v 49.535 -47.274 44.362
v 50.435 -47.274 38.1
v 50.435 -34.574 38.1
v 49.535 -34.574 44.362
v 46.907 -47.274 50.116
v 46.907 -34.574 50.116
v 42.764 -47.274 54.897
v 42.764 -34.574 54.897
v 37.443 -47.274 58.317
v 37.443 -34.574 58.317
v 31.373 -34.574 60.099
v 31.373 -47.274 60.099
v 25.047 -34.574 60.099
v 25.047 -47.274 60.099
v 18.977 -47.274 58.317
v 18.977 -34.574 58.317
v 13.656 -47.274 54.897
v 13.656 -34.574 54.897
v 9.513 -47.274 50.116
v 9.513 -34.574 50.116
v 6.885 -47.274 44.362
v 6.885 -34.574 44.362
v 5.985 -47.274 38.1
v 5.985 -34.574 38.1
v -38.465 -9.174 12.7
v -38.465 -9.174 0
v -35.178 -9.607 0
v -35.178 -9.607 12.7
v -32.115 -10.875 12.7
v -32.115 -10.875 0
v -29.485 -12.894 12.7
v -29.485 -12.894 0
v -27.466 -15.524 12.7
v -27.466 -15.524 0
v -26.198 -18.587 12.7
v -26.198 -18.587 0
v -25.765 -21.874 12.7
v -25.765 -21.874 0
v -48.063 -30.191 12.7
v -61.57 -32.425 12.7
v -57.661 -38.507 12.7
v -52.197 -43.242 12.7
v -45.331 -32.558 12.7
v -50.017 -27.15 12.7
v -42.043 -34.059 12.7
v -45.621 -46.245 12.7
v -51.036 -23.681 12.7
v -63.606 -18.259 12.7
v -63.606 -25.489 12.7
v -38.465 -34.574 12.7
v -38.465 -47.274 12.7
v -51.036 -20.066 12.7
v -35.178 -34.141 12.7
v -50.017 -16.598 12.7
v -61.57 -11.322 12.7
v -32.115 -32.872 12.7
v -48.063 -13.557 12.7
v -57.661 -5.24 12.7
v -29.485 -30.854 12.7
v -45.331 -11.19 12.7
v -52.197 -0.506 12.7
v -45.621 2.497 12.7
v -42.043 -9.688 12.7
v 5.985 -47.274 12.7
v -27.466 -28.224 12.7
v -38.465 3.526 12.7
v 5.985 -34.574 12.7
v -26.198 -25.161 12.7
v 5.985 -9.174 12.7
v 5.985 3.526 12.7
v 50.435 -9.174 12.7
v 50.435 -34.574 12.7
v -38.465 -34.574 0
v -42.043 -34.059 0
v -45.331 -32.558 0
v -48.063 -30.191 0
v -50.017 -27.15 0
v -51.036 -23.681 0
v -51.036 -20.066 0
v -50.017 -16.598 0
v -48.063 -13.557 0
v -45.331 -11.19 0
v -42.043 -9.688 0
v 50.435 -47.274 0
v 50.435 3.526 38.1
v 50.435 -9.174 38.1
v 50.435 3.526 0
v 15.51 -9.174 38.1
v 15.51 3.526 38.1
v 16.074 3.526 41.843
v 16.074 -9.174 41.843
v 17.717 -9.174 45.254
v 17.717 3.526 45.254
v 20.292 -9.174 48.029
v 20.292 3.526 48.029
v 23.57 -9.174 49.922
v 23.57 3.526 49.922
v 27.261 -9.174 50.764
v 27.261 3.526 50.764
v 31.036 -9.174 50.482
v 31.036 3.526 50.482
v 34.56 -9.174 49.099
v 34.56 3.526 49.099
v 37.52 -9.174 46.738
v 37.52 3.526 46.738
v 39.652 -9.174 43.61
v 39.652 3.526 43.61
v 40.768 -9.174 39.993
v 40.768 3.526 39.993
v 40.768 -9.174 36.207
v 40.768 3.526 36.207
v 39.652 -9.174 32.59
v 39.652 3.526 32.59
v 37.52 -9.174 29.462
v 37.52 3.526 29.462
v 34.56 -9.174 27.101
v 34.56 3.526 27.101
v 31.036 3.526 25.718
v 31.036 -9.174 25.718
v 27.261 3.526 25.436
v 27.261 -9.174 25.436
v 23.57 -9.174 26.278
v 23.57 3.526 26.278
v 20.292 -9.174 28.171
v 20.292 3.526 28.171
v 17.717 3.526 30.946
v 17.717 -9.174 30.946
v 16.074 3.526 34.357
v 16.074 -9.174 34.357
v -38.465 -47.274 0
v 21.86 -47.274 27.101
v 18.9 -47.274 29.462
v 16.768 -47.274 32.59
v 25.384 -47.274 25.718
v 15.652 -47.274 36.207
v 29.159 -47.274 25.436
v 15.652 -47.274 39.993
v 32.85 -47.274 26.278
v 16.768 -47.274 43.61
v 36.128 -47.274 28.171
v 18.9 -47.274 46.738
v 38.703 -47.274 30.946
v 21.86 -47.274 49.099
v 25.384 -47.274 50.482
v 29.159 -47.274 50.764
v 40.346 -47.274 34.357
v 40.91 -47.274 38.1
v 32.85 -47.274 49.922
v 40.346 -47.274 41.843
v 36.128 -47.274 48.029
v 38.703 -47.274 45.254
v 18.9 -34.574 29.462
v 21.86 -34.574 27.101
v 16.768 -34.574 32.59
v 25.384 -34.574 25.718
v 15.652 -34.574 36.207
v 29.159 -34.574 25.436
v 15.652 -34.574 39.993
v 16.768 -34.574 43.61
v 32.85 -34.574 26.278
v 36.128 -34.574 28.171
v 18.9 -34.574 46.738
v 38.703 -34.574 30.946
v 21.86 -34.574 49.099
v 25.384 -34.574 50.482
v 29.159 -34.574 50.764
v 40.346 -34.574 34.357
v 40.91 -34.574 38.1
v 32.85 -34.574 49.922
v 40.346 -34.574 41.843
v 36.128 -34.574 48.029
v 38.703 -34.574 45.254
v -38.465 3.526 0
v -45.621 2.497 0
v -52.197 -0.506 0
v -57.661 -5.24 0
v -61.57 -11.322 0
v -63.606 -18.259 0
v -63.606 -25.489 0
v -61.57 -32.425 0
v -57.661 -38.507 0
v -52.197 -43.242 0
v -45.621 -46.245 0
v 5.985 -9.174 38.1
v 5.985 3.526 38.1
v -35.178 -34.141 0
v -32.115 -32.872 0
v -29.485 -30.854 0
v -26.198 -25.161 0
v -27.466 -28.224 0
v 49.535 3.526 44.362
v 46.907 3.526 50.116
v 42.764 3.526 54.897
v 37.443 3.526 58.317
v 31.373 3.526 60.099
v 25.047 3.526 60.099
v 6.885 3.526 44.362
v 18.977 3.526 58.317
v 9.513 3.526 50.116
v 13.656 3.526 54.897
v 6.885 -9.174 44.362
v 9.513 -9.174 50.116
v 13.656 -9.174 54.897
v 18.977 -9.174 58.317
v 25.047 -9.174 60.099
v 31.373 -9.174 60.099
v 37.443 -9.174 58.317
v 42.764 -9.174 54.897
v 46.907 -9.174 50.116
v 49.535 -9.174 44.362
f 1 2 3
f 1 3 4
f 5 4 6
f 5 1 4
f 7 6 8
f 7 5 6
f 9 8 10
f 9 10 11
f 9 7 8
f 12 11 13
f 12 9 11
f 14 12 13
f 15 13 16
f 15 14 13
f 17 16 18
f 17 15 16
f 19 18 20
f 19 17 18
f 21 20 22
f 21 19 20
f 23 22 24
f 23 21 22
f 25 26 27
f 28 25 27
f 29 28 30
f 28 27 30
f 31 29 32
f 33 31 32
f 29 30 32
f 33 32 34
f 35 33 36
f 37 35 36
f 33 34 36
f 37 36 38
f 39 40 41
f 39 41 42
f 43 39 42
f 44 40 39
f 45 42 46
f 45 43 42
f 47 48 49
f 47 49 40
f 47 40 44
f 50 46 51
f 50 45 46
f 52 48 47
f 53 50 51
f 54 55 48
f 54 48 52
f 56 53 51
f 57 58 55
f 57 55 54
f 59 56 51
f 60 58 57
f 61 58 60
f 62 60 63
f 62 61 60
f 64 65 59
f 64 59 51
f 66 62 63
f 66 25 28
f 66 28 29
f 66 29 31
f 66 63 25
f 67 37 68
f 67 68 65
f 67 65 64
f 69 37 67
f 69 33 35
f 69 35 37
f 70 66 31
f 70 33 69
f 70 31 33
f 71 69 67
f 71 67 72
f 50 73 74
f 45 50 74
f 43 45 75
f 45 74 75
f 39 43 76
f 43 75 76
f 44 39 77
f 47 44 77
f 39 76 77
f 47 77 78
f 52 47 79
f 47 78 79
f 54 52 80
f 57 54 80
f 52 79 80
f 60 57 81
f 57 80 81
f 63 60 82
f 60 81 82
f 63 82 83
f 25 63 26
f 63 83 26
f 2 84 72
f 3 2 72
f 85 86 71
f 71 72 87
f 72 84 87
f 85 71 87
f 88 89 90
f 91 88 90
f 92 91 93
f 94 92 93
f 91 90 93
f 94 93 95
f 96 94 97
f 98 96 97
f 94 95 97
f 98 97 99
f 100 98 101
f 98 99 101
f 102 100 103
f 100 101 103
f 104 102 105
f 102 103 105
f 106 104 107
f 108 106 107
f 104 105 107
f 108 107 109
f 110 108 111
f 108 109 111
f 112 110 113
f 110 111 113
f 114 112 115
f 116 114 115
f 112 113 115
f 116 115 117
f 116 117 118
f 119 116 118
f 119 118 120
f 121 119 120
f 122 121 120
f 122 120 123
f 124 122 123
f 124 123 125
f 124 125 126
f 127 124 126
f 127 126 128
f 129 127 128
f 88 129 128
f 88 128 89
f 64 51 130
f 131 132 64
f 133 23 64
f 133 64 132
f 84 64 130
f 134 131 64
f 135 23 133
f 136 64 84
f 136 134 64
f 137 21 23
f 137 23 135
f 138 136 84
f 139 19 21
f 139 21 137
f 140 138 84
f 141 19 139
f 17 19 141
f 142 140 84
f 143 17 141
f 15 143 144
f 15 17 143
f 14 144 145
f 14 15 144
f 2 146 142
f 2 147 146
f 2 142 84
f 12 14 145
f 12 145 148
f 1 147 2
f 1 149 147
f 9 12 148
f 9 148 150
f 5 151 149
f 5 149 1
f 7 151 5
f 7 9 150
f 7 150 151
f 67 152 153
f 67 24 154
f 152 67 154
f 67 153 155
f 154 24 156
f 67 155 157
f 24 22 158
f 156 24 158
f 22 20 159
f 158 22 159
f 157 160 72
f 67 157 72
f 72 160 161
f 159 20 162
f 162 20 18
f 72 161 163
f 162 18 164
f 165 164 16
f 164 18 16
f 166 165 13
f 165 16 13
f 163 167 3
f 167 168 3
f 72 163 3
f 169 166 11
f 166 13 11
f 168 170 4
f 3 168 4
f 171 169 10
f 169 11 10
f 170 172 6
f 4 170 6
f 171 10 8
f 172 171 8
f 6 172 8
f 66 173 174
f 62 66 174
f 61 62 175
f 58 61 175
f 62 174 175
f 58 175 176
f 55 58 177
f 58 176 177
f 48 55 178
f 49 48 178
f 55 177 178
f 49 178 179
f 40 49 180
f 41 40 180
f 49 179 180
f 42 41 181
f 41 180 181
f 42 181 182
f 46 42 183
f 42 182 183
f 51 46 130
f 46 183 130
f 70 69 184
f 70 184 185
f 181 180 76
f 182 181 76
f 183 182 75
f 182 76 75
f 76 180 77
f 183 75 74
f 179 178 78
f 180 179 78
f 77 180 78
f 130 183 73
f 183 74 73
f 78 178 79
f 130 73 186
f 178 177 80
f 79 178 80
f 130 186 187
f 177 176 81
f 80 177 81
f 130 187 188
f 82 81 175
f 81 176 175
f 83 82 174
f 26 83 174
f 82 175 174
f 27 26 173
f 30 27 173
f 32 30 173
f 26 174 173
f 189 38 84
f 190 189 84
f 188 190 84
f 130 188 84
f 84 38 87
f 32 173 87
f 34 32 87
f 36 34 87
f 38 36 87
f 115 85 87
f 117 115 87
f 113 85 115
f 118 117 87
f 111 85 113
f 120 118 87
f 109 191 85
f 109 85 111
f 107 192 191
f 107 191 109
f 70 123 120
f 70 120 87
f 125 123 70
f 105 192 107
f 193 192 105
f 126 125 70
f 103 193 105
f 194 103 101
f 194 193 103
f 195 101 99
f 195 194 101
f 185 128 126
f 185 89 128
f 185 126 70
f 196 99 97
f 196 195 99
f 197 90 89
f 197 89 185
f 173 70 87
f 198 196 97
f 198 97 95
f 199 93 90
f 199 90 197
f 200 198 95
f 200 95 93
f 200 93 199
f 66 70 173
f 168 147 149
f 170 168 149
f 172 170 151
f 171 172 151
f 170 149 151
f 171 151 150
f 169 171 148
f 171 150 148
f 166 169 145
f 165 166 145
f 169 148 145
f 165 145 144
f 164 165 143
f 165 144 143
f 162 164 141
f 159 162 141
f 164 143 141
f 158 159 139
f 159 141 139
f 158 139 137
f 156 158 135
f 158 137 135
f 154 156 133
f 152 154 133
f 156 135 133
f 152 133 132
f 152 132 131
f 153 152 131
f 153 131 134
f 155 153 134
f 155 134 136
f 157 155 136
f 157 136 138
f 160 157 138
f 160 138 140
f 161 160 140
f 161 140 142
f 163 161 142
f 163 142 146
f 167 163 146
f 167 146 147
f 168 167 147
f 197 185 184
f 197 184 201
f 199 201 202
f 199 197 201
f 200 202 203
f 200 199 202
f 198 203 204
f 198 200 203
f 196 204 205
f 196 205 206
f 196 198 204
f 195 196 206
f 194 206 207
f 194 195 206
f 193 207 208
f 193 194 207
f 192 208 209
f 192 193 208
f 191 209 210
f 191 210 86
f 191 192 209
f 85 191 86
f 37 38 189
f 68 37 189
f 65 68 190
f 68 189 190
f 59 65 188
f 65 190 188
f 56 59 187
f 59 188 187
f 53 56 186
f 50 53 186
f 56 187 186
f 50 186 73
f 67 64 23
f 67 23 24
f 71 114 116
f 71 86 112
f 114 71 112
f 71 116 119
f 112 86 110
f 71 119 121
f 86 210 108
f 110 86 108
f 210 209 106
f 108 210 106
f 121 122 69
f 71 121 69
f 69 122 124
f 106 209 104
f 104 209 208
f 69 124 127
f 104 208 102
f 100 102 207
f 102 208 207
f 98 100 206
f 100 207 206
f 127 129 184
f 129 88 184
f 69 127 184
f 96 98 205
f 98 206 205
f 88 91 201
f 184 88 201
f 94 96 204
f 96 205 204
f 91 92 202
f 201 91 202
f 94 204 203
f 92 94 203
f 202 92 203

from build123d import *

# Parameters (mm, degrees)
F1_DEPTH  = 12.7
F2_DEPTH  = 12.7
F3_W      = 44.45
F3_H      = 12.7
F4_DEPTH  = 25.4
F6_DEPTH  = 12.7
F7_R      = 12.7
F8_DEPTH  = 25.4
F9_DEPTH  = 25.4
F11_DEPTH = 12.7
F12_R     = 12.7
F13_DEPTH = 25.4


with BuildPart() as f1:
    # F0 (on Top) → F1 (new body)
    with BuildSketch(Plane.XY):
        with BuildLine():
            ThreePointArc((-38.464964, 3.526151), (-63.864964, -21.873849), (-38.464964, -47.273849))
            Line((-38.464964, -47.273849), (-38.464964, -34.573849))
            ThreePointArc((-38.464964, -34.573849), (-51.164964, -21.873849), (-38.464964, -9.173849))
            Line((-38.464964, -9.173849), (-38.464964, 3.526151))
        make_face()
    extrude(amount=F1_DEPTH)

    # F0 (on Top) → F2 (join)
    with BuildSketch(Plane.XY):
        with BuildLine():
            Line((-38.464964, -47.273849), (50.435036, -47.273849))
            Line((50.435036, -47.273849), (50.435036, 3.526151))
            Line((50.435036, 3.526151), (-38.464964, 3.526151))
            Line((-38.464964, 3.526151), (-38.464964, -9.173849))
            ThreePointArc((-38.464964, -9.173849), (-29.484708, -12.893592), (-25.764964, -21.873849))
            ThreePointArc((-25.764964, -21.873849), (-29.484708, -30.854105), (-38.464964, -34.573849))
            Line((-38.464964, -34.573849), (-38.464964, -47.273849))
        make_face()
    extrude(amount=F2_DEPTH)

    # F3 (on face) → F4 (join)
    with BuildSketch(Plane.XY.offset(12.7)):
        with Locations((28.210036, -40.923849)):
            Rectangle(F3_W, F3_H)
    extrude(amount=F4_DEPTH)

    # F5 (on face) → F6 (join)
    with BuildSketch(Plane.XZ.offset(47.273849)):
        with BuildLine():
            Line((5.985036, 38.1), (50.435036, 38.1))
            ThreePointArc((50.435036, 38.1), (28.210036, 60.325), (5.985036, 38.1))
        make_face()
    extrude(amount=-F6_DEPTH)

    # F7 (on face) → F8 (cut)
    with BuildSketch(Plane.XZ.offset(47.273849)):
        with Locations((28.210036, 38.1)):
            Circle(F7_R)
    extrude(amount=-F8_DEPTH, mode=Mode.SUBTRACT)

    # F3 (on face) → F9 (join)
    with BuildSketch(Plane.XY.offset(12.7)):
        with Locations((28.210036, -2.823849)):
            Rectangle(F3_W, F3_H)
    extrude(amount=F9_DEPTH)

    # F10 (on face) → F11 (join)
    with BuildSketch(Plane(origin=(0, 3.526151, 0), x_dir=(-1, 0, 0), z_dir=(0, 1, 0))):
        with BuildLine():
            Line((-50.435036, 38.1), (-5.985036, 38.1))
            ThreePointArc((-5.985036, 38.1), (-28.210036, 60.325), (-50.435036, 38.1))
        make_face()
    extrude(amount=-F11_DEPTH)

    # F12 (on face) → F13 (cut)
    with BuildSketch(Plane(origin=(0, 3.526151, 0), x_dir=(-1, 0, 0), z_dir=(0, 1, 0))):
        with Locations((-28.210036, 38.1)):
            Circle(F12_R)
    extrude(amount=-F13_DEPTH, mode=Mode.SUBTRACT)


solid = f1.part
